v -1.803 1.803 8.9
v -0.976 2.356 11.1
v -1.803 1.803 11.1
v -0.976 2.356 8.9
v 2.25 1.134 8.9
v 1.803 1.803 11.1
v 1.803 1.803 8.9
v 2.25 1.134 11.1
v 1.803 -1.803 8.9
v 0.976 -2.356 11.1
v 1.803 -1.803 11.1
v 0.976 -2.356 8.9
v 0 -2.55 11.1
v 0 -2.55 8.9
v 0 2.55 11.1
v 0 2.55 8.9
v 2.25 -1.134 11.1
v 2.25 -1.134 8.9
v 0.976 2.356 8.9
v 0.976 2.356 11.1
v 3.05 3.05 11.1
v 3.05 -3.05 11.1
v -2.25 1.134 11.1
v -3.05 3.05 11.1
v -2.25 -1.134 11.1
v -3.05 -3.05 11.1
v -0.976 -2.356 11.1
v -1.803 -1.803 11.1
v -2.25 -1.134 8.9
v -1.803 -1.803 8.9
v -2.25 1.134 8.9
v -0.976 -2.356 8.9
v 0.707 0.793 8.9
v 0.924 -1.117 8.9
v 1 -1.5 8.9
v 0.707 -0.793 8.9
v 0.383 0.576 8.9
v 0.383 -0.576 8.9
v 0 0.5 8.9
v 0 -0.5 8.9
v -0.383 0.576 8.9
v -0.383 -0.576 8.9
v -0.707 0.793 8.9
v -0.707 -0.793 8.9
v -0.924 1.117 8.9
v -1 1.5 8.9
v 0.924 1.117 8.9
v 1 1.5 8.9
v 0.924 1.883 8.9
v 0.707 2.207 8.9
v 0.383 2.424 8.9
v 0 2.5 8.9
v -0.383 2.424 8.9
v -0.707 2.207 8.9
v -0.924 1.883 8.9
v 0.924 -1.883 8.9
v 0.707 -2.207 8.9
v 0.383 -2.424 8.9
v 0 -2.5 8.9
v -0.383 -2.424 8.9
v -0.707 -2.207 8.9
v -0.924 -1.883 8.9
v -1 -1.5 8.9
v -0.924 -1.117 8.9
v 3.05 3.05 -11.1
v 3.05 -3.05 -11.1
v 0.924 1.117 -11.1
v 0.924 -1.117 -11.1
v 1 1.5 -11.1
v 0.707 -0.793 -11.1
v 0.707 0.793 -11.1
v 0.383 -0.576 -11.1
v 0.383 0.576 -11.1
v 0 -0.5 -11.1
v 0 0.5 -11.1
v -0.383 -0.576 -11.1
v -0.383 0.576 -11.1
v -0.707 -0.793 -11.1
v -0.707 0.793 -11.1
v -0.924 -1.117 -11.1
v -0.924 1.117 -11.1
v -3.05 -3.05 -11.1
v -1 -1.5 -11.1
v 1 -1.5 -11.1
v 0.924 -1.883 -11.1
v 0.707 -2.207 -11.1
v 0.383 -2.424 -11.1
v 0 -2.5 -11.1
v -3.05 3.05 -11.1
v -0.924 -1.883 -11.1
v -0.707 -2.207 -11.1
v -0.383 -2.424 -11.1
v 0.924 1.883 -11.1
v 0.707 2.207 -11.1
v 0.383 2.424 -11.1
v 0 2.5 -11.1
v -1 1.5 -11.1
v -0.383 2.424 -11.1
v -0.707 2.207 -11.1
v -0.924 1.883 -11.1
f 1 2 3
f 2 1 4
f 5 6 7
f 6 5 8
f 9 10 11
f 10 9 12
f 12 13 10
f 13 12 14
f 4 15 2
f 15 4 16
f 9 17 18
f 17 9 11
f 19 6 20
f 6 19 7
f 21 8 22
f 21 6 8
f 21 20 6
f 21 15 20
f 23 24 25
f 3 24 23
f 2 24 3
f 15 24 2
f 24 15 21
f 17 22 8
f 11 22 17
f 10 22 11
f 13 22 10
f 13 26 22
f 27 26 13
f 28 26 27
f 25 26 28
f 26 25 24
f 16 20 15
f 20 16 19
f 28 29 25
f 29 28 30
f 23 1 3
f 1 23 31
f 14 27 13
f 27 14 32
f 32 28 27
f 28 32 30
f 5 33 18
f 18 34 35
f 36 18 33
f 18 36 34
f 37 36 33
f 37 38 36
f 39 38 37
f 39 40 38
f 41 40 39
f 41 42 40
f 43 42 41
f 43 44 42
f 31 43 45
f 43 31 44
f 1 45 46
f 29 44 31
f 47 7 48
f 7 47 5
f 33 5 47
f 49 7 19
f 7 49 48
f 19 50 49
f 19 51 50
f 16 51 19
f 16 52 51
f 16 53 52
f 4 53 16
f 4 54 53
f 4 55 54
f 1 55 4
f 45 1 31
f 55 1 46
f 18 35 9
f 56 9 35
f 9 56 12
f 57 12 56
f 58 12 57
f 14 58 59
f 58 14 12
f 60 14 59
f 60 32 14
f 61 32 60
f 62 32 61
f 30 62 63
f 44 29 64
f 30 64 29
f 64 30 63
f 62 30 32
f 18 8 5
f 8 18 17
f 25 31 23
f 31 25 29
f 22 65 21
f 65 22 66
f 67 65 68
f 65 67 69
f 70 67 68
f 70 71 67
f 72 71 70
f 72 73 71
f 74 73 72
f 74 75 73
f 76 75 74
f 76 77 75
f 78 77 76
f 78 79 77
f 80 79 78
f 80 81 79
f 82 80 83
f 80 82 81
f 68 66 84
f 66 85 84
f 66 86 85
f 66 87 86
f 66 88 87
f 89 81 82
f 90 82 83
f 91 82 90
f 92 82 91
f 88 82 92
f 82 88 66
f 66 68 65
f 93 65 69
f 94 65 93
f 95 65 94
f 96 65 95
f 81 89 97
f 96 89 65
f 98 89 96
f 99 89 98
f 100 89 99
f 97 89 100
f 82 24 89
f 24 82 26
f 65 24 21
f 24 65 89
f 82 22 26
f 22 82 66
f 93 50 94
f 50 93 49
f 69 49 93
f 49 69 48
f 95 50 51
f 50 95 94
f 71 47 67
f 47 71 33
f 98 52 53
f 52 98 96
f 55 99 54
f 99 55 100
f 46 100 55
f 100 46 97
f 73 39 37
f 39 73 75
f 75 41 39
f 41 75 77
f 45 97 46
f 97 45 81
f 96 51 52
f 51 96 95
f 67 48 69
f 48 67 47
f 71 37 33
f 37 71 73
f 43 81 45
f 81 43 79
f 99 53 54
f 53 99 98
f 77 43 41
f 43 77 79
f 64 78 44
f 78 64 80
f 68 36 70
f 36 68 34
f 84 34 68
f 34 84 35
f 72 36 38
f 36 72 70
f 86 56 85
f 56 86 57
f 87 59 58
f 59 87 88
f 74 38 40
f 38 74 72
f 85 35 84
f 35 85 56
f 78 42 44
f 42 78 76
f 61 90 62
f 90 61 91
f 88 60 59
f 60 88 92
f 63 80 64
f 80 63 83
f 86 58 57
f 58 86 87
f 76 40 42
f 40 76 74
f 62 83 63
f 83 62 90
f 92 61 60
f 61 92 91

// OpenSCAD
module photoresistorCasing(){
  fn=16;
  baseCubeHeight=22.2;
  photoresistorDiameter=5.1;
  photoresistorHeight=2.2;
  difference(){
    //Basiscubus
    translate([0, 0, 0])cube([photoresistorDiameter+1, photoresistorDiameter+1, baseCubeHeight], center = true);
    
    //Ausschnitt Photoresitor
    translate([0, 0, (baseCubeHeight-photoresistorHeight)/2])difference(){
      cylinder($fn = fn, d=photoresistorDiameter, h=photoresistorHeight, center=true);
      translate([+3/2 + 4.5/2, 0, 0])cube([3, 3, 3], center = true);
      translate([-3/2 - 4.5/2, 0, 0])cube([3, 3, 3], center = true);
    }
    
    //Löcher Beine Lichtsensor. Höhe extra übertrieben, ging nicht anders.
    translate([0,  (4-1)/2, -(baseCubeHeight-20)/2])cylinder($fn = fn, d=2, h=22, center=true);
    translate([0, -(4-1)/2, -(baseCubeHeight-20)/2])cylinder($fn = fn, d=2, h=22, center=true);
  }
}

photoresistorCasing();
